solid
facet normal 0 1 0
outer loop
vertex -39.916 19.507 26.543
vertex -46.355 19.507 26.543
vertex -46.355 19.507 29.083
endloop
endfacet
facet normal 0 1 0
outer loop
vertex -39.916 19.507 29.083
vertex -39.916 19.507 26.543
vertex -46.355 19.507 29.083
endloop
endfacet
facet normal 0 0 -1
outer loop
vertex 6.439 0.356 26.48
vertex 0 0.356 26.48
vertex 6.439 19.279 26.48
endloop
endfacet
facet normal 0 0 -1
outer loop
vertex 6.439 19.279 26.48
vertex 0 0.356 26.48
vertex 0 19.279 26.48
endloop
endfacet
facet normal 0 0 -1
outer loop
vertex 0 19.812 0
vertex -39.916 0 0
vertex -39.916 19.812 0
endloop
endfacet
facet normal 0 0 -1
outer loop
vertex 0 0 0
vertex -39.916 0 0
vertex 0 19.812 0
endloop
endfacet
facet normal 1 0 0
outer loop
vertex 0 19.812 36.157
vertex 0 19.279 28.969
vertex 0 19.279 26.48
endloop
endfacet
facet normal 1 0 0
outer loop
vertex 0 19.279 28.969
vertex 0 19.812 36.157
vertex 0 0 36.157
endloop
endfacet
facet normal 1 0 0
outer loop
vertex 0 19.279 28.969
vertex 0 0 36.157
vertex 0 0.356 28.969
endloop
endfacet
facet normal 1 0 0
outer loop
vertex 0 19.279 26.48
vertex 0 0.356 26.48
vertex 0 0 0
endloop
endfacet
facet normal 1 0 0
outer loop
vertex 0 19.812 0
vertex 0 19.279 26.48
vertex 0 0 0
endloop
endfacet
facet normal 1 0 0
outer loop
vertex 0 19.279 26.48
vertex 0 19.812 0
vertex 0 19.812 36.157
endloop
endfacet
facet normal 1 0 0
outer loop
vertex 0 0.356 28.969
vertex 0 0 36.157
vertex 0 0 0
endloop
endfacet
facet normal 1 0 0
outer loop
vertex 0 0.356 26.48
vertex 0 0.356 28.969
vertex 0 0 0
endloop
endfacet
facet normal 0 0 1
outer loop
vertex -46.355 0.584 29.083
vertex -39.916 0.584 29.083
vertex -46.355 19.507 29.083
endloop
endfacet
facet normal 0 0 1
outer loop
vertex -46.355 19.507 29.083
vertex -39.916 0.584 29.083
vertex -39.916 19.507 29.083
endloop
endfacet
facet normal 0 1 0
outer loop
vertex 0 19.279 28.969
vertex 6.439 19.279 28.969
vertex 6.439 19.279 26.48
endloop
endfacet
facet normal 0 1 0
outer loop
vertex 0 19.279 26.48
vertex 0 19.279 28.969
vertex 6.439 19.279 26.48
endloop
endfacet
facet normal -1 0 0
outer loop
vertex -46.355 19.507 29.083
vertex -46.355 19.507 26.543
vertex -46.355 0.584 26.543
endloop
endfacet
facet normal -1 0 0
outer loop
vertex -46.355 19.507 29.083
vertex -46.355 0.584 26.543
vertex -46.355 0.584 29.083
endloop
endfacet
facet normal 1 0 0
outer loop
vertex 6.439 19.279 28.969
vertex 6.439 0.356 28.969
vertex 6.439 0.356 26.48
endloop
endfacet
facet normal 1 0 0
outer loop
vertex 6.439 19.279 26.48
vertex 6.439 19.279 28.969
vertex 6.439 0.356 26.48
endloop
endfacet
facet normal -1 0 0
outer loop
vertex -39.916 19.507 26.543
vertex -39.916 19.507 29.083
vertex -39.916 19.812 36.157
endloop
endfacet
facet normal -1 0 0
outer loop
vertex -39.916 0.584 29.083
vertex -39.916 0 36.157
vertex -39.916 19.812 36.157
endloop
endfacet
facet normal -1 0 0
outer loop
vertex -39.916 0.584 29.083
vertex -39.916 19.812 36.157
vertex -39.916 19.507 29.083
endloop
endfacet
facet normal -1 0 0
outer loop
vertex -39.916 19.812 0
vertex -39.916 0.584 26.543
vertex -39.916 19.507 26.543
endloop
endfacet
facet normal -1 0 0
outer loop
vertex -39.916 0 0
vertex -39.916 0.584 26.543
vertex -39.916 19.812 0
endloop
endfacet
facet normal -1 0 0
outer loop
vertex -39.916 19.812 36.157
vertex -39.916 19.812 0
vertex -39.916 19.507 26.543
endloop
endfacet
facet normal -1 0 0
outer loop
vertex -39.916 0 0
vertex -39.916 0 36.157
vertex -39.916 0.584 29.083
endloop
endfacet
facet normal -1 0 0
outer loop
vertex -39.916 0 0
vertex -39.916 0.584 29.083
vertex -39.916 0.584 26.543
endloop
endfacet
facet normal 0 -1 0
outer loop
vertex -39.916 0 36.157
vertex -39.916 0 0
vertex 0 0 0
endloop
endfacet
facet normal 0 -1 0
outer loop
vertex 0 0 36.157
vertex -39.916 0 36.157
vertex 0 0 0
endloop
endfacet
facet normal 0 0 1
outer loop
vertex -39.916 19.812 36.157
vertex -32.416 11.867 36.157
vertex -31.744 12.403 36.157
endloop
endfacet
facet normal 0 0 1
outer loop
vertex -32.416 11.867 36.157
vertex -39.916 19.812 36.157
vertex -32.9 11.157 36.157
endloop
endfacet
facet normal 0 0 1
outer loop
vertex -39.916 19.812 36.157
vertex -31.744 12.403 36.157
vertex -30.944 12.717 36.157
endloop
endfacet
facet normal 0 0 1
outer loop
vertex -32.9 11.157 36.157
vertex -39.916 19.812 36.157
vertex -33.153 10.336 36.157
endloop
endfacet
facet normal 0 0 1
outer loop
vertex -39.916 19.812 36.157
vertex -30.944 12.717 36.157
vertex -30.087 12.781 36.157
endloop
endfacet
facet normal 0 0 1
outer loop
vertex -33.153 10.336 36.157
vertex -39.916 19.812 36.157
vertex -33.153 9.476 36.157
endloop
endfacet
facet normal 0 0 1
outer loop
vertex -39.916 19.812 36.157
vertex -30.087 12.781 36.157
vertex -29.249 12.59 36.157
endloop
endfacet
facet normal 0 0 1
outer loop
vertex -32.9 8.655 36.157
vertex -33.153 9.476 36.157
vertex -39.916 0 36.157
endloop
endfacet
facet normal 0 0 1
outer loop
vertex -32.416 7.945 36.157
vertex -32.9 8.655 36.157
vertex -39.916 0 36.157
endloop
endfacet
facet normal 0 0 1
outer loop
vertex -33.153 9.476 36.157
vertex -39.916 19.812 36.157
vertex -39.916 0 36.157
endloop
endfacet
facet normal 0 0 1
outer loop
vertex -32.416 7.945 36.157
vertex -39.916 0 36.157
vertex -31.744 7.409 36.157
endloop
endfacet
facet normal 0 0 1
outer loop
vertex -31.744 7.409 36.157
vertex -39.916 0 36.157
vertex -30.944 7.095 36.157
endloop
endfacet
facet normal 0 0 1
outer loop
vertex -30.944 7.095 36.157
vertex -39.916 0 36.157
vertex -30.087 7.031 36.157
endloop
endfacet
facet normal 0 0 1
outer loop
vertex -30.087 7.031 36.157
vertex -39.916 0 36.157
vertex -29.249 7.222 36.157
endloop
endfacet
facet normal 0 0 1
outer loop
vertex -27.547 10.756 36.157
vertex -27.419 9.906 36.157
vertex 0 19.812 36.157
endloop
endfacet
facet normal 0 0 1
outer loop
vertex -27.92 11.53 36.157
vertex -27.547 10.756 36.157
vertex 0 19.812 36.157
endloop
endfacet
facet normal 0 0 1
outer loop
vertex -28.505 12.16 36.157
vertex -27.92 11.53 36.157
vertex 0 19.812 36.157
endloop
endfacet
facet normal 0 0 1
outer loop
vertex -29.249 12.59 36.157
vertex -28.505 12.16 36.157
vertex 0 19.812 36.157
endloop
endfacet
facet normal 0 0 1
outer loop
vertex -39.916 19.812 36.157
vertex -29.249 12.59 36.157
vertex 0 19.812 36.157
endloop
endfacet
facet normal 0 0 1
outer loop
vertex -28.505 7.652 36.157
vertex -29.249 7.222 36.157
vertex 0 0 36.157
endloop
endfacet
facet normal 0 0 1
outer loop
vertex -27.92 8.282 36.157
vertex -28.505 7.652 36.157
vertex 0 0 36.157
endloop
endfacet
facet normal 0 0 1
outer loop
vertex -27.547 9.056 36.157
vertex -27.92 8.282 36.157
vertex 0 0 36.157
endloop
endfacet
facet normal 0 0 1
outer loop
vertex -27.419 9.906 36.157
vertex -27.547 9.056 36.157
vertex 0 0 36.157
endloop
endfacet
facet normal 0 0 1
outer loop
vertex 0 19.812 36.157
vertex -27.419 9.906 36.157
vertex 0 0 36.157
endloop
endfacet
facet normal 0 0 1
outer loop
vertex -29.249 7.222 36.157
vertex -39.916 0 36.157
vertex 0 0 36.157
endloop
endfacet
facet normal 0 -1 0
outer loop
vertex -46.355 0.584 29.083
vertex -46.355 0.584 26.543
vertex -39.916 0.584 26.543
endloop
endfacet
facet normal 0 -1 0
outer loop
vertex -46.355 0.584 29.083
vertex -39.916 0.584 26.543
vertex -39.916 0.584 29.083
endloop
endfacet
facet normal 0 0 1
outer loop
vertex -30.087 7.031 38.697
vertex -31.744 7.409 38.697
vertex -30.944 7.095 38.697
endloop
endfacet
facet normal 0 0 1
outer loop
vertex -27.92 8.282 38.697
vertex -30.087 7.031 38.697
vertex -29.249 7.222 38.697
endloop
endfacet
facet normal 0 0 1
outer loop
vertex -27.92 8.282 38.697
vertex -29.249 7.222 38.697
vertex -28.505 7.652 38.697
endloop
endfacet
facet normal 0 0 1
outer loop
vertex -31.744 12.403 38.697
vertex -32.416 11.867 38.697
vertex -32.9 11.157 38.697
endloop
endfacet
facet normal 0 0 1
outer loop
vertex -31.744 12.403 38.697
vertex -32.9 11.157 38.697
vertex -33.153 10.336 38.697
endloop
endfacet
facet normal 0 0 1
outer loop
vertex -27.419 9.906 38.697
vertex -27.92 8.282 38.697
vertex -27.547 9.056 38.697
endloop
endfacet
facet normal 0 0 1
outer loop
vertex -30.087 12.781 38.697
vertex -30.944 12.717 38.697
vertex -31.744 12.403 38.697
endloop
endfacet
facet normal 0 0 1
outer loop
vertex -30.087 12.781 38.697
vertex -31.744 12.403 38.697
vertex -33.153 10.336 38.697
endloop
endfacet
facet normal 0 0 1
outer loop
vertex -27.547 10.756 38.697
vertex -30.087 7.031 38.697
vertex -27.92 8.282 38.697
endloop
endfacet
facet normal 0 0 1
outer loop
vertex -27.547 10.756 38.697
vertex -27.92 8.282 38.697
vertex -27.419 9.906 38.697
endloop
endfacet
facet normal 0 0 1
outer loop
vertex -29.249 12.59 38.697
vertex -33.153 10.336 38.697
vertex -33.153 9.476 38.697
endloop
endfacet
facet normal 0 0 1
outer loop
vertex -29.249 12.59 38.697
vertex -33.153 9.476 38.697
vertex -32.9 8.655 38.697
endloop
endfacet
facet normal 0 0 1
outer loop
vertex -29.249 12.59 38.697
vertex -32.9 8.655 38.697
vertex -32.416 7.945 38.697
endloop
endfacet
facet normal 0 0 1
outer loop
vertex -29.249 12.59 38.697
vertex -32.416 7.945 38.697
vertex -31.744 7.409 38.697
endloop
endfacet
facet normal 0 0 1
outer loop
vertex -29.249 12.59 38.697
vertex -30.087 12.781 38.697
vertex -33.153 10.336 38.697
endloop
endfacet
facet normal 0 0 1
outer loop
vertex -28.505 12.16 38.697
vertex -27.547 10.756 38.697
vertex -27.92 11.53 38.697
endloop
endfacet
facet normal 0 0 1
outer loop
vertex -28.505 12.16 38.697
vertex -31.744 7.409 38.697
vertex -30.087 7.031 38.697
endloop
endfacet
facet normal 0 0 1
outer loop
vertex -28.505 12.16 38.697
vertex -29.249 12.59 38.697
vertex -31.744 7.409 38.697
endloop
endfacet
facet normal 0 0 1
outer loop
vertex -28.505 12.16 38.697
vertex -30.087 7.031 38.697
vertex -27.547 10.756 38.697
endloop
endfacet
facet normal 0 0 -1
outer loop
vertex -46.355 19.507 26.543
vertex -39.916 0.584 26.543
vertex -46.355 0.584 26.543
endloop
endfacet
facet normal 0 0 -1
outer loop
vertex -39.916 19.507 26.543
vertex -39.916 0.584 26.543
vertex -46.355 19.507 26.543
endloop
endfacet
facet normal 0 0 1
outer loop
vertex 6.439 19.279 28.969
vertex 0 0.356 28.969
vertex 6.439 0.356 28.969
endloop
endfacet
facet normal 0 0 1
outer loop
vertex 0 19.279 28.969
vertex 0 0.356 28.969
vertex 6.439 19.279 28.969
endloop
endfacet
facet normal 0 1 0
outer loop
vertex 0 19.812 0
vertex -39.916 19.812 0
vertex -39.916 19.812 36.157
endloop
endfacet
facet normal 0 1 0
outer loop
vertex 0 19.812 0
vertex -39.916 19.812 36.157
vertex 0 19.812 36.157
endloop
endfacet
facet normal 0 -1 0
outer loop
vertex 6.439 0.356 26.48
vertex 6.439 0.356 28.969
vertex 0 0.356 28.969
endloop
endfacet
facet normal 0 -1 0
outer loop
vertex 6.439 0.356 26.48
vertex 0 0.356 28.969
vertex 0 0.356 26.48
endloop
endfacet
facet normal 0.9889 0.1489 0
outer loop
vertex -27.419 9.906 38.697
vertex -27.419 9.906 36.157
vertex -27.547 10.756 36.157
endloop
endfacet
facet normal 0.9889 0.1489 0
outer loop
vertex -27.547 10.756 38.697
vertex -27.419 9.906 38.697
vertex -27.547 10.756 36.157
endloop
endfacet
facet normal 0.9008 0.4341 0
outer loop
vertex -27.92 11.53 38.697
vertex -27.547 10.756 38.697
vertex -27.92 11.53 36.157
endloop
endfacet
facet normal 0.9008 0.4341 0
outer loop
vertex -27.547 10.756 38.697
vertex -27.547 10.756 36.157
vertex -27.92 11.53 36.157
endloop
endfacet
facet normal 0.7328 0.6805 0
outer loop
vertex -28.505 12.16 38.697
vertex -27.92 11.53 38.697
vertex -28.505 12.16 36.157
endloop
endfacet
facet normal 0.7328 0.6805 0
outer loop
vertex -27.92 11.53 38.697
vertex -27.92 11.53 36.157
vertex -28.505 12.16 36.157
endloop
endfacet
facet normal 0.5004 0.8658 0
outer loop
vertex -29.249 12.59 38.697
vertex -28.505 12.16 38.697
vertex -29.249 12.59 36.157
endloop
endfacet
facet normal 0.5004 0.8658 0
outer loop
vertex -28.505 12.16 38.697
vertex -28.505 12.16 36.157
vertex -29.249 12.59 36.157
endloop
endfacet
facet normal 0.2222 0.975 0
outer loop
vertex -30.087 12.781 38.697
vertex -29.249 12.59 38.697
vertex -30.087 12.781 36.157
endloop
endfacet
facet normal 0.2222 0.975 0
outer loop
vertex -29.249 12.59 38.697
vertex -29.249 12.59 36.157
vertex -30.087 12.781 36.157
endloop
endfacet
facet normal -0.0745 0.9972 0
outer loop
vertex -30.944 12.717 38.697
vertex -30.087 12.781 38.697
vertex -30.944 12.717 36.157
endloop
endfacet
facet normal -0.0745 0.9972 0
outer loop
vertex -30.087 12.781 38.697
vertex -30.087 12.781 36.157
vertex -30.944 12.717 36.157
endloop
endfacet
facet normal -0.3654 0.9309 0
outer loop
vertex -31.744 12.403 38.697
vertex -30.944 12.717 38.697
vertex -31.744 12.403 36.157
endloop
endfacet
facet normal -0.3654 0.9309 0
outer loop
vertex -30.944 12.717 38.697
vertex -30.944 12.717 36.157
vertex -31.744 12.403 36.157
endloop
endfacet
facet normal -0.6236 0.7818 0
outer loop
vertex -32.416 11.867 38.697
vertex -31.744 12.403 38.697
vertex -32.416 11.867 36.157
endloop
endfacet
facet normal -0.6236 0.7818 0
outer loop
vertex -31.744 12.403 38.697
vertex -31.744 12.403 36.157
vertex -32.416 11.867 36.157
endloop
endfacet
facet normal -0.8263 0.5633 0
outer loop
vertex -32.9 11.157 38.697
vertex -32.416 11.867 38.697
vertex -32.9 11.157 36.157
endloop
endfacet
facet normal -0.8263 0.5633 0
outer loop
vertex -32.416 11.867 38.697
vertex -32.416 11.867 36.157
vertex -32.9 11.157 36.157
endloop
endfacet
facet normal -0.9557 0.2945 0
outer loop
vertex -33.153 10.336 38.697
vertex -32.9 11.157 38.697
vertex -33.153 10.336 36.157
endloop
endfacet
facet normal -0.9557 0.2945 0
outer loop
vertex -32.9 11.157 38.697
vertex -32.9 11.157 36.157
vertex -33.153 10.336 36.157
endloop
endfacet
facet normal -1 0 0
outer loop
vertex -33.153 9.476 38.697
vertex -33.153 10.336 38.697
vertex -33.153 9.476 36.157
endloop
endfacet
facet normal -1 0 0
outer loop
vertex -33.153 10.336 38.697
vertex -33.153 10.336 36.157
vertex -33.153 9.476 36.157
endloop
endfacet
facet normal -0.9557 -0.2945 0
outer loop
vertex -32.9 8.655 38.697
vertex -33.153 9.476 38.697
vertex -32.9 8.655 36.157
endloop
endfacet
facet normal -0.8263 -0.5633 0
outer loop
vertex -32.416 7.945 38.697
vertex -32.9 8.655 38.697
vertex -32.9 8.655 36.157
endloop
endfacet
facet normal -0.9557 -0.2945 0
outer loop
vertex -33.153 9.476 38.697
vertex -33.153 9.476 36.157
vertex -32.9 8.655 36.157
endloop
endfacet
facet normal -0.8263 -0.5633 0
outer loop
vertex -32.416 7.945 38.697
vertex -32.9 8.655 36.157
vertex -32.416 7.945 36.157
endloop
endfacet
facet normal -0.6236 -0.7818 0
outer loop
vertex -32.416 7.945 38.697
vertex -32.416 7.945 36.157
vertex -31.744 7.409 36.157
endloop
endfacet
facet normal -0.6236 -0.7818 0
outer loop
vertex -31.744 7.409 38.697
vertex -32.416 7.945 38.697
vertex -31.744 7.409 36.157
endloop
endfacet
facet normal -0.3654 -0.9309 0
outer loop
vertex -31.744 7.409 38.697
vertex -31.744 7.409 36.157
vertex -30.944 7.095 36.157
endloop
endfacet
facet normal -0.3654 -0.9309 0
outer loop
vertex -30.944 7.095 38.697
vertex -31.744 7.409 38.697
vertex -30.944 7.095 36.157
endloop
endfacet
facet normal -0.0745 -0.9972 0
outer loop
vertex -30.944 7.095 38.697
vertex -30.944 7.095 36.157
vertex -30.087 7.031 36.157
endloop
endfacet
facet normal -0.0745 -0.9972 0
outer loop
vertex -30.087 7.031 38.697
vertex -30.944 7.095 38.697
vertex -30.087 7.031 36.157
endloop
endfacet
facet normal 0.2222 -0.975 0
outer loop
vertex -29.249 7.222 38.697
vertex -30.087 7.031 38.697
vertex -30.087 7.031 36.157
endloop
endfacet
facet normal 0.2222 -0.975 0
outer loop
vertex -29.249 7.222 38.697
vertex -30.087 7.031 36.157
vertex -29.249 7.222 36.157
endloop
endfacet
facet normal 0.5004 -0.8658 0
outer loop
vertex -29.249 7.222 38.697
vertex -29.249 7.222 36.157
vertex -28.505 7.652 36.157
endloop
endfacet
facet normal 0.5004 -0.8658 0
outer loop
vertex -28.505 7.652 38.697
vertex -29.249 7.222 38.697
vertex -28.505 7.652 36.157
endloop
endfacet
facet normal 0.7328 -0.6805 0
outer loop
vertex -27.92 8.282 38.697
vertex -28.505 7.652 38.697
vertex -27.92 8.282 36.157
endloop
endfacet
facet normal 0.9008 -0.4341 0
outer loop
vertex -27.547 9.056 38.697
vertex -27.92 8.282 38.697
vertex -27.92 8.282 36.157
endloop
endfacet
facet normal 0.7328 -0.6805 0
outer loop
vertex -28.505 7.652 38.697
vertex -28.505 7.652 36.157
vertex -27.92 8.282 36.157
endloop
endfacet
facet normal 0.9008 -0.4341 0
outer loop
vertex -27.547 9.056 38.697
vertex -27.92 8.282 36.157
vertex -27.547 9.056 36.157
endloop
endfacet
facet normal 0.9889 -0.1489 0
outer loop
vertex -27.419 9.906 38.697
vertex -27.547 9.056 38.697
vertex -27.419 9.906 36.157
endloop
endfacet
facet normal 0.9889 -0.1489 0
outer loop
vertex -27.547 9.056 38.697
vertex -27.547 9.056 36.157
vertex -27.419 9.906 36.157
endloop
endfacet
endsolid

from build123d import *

# Parameters (mm, degrees)
SKETCH1_W           = 39.9161
SKETCH1_H           = 36.1569
BOSS_EXTRUDE1_DEPTH = 19.812
SKETCH2_W           = 2.4892
SKETCH2_H           = 18.923
BOSS_EXTRUDE3_DEPTH = 6.4389
SKETCH4_W           = 2.54
SKETCH4_H           = 18.923
BOSS_EXTRUDE4_DEPTH = 6.4389
SKETCH5_R           = 2.8829
BOSS_EXTRUDE5_DEPTH = 2.54


with BuildPart() as part:
    # Sketch1 → Boss-Extrude1 (new body)
    with BuildSketch(Plane(origin=(0, 0, 0), x_dir=(1, 0, 0), z_dir=(0, 1, 0))):
        with Locations((-19.95805, -18.07845)):
            Rectangle(SKETCH1_W, SKETCH1_H)
    extrude(amount=BOSS_EXTRUDE1_DEPTH)

    # Sketch2 → Boss-Extrude3 (add)
    with BuildSketch(Plane(origin=(0, 0, 0), x_dir=(0, 0, -1), z_dir=(1, 0, 0))):
        with Locations((-27.7241, 9.8171)):
            Rectangle(SKETCH2_W, SKETCH2_H)
    extrude(amount=BOSS_EXTRUDE3_DEPTH)

    # Sketch4 → Boss-Extrude4 (add)
    with BuildSketch(Plane.ZY.offset(39.9161)):
        with Locations((27.813, 10.0457)):
            Rectangle(SKETCH4_W, SKETCH4_H)
    extrude(amount=BOSS_EXTRUDE4_DEPTH)

    # Sketch5 → Boss-Extrude5 (add)
    with BuildSketch(Plane.XY.offset(36.1569)):
        with Locations((-30.3022, 9.906)):
            Circle(SKETCH5_R)
    extrude(amount=BOSS_EXTRUDE5_DEPTH)


solid = part.part
